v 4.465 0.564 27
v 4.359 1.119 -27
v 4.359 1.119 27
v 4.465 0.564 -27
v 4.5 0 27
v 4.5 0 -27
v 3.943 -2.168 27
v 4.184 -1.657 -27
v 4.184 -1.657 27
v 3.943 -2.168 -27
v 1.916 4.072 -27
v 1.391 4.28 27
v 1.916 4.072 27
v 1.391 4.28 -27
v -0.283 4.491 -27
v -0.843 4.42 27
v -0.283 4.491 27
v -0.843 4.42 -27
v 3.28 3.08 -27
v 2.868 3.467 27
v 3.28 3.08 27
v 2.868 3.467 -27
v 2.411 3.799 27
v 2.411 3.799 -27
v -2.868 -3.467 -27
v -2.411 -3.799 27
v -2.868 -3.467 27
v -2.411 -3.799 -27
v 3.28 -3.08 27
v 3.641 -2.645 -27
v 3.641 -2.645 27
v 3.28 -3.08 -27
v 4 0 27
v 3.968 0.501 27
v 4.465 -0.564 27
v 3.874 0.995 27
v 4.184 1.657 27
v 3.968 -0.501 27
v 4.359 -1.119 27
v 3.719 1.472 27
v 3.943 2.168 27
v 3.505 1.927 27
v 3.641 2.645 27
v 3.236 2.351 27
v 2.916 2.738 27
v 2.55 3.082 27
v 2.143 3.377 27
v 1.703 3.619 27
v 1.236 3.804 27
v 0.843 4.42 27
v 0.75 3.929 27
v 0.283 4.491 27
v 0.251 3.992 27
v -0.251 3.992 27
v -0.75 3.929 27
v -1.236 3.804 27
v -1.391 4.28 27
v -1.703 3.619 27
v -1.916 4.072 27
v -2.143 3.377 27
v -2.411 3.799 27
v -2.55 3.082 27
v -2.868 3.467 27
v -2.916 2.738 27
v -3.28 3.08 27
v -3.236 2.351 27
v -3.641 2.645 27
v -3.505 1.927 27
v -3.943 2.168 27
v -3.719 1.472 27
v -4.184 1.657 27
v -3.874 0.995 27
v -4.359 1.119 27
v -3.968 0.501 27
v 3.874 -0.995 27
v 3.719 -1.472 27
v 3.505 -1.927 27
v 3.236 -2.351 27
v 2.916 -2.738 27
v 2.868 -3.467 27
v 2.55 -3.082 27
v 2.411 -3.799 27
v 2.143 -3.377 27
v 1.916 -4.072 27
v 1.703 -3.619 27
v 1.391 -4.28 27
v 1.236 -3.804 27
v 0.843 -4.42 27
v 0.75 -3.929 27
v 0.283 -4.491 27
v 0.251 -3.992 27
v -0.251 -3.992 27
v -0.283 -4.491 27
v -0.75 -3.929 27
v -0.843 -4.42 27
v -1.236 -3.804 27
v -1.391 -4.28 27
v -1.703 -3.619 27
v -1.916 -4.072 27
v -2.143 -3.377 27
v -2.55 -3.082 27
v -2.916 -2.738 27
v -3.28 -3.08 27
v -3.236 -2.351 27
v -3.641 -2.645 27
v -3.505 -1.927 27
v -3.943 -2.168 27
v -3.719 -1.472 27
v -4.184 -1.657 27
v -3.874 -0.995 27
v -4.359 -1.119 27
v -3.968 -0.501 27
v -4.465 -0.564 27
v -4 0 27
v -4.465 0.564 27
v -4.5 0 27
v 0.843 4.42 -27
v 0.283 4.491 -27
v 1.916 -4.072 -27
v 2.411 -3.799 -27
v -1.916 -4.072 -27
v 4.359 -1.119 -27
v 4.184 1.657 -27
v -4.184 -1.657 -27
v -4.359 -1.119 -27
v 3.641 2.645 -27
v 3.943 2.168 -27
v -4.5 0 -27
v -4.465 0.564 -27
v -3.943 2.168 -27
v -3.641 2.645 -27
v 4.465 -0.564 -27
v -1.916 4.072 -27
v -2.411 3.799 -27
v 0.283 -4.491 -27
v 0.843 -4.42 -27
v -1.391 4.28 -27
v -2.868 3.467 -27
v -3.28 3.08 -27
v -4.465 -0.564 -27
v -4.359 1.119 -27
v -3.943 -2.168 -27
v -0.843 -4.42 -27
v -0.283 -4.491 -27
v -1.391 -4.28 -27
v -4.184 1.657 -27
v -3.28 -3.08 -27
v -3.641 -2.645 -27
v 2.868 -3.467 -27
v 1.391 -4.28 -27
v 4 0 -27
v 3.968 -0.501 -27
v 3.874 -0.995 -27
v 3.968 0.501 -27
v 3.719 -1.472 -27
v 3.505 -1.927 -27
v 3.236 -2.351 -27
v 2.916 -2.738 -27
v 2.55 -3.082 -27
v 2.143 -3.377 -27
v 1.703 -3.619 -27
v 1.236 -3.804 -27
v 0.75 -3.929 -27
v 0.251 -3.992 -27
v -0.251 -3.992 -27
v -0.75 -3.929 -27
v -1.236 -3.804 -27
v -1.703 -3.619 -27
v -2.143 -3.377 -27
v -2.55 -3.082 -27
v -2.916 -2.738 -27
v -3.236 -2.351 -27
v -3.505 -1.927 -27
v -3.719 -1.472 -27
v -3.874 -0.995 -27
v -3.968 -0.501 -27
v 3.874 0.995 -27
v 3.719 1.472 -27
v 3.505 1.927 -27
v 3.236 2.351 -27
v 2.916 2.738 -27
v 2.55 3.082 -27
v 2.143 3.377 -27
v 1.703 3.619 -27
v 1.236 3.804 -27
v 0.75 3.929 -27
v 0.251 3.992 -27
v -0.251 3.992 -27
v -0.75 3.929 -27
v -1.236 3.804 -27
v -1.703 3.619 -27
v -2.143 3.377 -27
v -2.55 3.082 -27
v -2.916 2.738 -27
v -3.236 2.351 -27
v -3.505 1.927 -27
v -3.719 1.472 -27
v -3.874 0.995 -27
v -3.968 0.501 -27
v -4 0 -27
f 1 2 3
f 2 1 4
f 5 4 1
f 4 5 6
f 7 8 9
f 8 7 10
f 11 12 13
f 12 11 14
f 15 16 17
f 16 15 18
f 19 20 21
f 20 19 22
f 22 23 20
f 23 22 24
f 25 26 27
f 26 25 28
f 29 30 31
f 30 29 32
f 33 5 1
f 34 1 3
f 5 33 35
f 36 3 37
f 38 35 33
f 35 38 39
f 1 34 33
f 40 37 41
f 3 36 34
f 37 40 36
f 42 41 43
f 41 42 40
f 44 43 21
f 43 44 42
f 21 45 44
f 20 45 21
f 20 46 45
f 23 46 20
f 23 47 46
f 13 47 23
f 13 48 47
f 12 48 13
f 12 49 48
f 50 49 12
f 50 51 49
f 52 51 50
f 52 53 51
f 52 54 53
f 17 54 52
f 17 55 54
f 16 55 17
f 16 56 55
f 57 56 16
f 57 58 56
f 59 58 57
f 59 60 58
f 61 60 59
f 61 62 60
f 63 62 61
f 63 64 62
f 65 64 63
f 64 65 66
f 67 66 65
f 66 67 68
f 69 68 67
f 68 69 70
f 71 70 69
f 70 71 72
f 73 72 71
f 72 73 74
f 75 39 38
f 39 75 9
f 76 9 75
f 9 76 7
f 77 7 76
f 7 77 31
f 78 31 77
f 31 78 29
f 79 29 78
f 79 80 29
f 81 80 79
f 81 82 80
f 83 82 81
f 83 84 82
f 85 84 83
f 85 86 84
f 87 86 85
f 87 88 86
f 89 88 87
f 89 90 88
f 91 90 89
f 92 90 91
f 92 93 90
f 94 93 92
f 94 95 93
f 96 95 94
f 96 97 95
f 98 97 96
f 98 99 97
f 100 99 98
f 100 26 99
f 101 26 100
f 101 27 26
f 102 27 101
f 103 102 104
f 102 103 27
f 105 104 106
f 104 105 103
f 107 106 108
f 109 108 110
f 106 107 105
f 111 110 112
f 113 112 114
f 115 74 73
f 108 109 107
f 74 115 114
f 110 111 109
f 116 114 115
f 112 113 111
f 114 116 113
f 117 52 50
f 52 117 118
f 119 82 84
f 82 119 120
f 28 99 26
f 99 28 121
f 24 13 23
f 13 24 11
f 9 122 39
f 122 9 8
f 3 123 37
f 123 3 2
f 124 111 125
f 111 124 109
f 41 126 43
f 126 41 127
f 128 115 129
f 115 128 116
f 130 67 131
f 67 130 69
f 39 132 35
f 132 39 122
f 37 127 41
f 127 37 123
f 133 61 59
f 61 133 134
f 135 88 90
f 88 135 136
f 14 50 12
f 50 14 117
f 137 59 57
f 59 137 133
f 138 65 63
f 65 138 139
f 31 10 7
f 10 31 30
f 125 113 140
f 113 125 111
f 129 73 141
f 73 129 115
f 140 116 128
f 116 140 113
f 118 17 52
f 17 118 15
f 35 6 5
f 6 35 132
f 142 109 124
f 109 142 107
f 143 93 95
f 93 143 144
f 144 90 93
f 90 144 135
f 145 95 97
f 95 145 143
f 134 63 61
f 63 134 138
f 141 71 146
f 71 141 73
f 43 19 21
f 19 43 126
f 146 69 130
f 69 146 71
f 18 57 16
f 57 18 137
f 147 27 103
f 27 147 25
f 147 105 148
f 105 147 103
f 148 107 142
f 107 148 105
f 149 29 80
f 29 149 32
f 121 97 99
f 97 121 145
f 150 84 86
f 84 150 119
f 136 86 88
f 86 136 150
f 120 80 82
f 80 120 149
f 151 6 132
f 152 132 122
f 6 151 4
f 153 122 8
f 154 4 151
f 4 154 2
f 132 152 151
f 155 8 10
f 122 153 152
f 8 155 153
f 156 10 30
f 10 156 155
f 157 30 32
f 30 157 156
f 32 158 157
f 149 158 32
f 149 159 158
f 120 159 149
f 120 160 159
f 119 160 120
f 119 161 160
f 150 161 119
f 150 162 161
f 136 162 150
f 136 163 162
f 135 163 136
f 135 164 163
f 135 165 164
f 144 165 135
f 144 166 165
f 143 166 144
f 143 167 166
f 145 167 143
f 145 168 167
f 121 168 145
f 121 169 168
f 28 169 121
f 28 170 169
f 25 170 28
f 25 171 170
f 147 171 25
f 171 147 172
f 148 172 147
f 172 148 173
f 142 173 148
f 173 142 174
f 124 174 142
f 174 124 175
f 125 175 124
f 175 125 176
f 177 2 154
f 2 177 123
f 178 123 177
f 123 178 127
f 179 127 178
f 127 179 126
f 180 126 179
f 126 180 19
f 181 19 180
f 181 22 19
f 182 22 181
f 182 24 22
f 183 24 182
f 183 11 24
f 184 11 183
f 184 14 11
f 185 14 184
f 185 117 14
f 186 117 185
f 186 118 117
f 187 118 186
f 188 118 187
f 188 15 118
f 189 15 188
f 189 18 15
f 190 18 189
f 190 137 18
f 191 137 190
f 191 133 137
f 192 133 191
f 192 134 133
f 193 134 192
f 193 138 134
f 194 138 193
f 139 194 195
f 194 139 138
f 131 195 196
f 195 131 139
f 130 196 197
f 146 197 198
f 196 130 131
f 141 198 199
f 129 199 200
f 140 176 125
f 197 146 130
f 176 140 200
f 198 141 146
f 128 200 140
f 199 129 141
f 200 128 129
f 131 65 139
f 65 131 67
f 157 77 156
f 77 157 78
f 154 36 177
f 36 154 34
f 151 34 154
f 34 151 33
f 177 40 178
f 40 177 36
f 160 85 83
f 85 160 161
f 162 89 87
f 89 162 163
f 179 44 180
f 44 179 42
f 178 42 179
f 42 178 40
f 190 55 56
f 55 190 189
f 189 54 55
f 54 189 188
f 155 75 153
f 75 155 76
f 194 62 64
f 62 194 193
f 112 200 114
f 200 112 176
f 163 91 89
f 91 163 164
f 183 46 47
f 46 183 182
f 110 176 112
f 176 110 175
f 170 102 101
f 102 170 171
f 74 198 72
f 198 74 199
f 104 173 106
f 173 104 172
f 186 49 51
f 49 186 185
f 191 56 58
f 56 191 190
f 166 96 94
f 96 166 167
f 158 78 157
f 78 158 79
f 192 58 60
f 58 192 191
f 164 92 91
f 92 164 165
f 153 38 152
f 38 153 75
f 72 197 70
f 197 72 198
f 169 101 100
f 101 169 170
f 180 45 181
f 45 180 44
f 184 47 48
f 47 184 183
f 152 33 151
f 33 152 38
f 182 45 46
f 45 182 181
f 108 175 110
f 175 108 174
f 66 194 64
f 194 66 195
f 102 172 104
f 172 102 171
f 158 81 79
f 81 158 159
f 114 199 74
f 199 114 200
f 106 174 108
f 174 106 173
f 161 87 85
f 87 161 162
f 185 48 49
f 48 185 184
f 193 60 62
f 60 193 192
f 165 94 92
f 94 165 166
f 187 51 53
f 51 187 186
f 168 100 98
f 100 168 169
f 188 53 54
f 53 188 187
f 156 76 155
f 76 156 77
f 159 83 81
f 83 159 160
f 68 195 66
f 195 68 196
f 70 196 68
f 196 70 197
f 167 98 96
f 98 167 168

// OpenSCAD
$fn = 50;


difference() {
	union() {
		translate(v = [0, 0, -27.0000000000]) {
			cylinder(h = 54, r = 4.5000000000);
		}
	}
	union() {
		translate(v = [0, 0, -100.0000000000]) {
			cylinder(h = 200, r = 4.0000000000);
		}
	}
}
